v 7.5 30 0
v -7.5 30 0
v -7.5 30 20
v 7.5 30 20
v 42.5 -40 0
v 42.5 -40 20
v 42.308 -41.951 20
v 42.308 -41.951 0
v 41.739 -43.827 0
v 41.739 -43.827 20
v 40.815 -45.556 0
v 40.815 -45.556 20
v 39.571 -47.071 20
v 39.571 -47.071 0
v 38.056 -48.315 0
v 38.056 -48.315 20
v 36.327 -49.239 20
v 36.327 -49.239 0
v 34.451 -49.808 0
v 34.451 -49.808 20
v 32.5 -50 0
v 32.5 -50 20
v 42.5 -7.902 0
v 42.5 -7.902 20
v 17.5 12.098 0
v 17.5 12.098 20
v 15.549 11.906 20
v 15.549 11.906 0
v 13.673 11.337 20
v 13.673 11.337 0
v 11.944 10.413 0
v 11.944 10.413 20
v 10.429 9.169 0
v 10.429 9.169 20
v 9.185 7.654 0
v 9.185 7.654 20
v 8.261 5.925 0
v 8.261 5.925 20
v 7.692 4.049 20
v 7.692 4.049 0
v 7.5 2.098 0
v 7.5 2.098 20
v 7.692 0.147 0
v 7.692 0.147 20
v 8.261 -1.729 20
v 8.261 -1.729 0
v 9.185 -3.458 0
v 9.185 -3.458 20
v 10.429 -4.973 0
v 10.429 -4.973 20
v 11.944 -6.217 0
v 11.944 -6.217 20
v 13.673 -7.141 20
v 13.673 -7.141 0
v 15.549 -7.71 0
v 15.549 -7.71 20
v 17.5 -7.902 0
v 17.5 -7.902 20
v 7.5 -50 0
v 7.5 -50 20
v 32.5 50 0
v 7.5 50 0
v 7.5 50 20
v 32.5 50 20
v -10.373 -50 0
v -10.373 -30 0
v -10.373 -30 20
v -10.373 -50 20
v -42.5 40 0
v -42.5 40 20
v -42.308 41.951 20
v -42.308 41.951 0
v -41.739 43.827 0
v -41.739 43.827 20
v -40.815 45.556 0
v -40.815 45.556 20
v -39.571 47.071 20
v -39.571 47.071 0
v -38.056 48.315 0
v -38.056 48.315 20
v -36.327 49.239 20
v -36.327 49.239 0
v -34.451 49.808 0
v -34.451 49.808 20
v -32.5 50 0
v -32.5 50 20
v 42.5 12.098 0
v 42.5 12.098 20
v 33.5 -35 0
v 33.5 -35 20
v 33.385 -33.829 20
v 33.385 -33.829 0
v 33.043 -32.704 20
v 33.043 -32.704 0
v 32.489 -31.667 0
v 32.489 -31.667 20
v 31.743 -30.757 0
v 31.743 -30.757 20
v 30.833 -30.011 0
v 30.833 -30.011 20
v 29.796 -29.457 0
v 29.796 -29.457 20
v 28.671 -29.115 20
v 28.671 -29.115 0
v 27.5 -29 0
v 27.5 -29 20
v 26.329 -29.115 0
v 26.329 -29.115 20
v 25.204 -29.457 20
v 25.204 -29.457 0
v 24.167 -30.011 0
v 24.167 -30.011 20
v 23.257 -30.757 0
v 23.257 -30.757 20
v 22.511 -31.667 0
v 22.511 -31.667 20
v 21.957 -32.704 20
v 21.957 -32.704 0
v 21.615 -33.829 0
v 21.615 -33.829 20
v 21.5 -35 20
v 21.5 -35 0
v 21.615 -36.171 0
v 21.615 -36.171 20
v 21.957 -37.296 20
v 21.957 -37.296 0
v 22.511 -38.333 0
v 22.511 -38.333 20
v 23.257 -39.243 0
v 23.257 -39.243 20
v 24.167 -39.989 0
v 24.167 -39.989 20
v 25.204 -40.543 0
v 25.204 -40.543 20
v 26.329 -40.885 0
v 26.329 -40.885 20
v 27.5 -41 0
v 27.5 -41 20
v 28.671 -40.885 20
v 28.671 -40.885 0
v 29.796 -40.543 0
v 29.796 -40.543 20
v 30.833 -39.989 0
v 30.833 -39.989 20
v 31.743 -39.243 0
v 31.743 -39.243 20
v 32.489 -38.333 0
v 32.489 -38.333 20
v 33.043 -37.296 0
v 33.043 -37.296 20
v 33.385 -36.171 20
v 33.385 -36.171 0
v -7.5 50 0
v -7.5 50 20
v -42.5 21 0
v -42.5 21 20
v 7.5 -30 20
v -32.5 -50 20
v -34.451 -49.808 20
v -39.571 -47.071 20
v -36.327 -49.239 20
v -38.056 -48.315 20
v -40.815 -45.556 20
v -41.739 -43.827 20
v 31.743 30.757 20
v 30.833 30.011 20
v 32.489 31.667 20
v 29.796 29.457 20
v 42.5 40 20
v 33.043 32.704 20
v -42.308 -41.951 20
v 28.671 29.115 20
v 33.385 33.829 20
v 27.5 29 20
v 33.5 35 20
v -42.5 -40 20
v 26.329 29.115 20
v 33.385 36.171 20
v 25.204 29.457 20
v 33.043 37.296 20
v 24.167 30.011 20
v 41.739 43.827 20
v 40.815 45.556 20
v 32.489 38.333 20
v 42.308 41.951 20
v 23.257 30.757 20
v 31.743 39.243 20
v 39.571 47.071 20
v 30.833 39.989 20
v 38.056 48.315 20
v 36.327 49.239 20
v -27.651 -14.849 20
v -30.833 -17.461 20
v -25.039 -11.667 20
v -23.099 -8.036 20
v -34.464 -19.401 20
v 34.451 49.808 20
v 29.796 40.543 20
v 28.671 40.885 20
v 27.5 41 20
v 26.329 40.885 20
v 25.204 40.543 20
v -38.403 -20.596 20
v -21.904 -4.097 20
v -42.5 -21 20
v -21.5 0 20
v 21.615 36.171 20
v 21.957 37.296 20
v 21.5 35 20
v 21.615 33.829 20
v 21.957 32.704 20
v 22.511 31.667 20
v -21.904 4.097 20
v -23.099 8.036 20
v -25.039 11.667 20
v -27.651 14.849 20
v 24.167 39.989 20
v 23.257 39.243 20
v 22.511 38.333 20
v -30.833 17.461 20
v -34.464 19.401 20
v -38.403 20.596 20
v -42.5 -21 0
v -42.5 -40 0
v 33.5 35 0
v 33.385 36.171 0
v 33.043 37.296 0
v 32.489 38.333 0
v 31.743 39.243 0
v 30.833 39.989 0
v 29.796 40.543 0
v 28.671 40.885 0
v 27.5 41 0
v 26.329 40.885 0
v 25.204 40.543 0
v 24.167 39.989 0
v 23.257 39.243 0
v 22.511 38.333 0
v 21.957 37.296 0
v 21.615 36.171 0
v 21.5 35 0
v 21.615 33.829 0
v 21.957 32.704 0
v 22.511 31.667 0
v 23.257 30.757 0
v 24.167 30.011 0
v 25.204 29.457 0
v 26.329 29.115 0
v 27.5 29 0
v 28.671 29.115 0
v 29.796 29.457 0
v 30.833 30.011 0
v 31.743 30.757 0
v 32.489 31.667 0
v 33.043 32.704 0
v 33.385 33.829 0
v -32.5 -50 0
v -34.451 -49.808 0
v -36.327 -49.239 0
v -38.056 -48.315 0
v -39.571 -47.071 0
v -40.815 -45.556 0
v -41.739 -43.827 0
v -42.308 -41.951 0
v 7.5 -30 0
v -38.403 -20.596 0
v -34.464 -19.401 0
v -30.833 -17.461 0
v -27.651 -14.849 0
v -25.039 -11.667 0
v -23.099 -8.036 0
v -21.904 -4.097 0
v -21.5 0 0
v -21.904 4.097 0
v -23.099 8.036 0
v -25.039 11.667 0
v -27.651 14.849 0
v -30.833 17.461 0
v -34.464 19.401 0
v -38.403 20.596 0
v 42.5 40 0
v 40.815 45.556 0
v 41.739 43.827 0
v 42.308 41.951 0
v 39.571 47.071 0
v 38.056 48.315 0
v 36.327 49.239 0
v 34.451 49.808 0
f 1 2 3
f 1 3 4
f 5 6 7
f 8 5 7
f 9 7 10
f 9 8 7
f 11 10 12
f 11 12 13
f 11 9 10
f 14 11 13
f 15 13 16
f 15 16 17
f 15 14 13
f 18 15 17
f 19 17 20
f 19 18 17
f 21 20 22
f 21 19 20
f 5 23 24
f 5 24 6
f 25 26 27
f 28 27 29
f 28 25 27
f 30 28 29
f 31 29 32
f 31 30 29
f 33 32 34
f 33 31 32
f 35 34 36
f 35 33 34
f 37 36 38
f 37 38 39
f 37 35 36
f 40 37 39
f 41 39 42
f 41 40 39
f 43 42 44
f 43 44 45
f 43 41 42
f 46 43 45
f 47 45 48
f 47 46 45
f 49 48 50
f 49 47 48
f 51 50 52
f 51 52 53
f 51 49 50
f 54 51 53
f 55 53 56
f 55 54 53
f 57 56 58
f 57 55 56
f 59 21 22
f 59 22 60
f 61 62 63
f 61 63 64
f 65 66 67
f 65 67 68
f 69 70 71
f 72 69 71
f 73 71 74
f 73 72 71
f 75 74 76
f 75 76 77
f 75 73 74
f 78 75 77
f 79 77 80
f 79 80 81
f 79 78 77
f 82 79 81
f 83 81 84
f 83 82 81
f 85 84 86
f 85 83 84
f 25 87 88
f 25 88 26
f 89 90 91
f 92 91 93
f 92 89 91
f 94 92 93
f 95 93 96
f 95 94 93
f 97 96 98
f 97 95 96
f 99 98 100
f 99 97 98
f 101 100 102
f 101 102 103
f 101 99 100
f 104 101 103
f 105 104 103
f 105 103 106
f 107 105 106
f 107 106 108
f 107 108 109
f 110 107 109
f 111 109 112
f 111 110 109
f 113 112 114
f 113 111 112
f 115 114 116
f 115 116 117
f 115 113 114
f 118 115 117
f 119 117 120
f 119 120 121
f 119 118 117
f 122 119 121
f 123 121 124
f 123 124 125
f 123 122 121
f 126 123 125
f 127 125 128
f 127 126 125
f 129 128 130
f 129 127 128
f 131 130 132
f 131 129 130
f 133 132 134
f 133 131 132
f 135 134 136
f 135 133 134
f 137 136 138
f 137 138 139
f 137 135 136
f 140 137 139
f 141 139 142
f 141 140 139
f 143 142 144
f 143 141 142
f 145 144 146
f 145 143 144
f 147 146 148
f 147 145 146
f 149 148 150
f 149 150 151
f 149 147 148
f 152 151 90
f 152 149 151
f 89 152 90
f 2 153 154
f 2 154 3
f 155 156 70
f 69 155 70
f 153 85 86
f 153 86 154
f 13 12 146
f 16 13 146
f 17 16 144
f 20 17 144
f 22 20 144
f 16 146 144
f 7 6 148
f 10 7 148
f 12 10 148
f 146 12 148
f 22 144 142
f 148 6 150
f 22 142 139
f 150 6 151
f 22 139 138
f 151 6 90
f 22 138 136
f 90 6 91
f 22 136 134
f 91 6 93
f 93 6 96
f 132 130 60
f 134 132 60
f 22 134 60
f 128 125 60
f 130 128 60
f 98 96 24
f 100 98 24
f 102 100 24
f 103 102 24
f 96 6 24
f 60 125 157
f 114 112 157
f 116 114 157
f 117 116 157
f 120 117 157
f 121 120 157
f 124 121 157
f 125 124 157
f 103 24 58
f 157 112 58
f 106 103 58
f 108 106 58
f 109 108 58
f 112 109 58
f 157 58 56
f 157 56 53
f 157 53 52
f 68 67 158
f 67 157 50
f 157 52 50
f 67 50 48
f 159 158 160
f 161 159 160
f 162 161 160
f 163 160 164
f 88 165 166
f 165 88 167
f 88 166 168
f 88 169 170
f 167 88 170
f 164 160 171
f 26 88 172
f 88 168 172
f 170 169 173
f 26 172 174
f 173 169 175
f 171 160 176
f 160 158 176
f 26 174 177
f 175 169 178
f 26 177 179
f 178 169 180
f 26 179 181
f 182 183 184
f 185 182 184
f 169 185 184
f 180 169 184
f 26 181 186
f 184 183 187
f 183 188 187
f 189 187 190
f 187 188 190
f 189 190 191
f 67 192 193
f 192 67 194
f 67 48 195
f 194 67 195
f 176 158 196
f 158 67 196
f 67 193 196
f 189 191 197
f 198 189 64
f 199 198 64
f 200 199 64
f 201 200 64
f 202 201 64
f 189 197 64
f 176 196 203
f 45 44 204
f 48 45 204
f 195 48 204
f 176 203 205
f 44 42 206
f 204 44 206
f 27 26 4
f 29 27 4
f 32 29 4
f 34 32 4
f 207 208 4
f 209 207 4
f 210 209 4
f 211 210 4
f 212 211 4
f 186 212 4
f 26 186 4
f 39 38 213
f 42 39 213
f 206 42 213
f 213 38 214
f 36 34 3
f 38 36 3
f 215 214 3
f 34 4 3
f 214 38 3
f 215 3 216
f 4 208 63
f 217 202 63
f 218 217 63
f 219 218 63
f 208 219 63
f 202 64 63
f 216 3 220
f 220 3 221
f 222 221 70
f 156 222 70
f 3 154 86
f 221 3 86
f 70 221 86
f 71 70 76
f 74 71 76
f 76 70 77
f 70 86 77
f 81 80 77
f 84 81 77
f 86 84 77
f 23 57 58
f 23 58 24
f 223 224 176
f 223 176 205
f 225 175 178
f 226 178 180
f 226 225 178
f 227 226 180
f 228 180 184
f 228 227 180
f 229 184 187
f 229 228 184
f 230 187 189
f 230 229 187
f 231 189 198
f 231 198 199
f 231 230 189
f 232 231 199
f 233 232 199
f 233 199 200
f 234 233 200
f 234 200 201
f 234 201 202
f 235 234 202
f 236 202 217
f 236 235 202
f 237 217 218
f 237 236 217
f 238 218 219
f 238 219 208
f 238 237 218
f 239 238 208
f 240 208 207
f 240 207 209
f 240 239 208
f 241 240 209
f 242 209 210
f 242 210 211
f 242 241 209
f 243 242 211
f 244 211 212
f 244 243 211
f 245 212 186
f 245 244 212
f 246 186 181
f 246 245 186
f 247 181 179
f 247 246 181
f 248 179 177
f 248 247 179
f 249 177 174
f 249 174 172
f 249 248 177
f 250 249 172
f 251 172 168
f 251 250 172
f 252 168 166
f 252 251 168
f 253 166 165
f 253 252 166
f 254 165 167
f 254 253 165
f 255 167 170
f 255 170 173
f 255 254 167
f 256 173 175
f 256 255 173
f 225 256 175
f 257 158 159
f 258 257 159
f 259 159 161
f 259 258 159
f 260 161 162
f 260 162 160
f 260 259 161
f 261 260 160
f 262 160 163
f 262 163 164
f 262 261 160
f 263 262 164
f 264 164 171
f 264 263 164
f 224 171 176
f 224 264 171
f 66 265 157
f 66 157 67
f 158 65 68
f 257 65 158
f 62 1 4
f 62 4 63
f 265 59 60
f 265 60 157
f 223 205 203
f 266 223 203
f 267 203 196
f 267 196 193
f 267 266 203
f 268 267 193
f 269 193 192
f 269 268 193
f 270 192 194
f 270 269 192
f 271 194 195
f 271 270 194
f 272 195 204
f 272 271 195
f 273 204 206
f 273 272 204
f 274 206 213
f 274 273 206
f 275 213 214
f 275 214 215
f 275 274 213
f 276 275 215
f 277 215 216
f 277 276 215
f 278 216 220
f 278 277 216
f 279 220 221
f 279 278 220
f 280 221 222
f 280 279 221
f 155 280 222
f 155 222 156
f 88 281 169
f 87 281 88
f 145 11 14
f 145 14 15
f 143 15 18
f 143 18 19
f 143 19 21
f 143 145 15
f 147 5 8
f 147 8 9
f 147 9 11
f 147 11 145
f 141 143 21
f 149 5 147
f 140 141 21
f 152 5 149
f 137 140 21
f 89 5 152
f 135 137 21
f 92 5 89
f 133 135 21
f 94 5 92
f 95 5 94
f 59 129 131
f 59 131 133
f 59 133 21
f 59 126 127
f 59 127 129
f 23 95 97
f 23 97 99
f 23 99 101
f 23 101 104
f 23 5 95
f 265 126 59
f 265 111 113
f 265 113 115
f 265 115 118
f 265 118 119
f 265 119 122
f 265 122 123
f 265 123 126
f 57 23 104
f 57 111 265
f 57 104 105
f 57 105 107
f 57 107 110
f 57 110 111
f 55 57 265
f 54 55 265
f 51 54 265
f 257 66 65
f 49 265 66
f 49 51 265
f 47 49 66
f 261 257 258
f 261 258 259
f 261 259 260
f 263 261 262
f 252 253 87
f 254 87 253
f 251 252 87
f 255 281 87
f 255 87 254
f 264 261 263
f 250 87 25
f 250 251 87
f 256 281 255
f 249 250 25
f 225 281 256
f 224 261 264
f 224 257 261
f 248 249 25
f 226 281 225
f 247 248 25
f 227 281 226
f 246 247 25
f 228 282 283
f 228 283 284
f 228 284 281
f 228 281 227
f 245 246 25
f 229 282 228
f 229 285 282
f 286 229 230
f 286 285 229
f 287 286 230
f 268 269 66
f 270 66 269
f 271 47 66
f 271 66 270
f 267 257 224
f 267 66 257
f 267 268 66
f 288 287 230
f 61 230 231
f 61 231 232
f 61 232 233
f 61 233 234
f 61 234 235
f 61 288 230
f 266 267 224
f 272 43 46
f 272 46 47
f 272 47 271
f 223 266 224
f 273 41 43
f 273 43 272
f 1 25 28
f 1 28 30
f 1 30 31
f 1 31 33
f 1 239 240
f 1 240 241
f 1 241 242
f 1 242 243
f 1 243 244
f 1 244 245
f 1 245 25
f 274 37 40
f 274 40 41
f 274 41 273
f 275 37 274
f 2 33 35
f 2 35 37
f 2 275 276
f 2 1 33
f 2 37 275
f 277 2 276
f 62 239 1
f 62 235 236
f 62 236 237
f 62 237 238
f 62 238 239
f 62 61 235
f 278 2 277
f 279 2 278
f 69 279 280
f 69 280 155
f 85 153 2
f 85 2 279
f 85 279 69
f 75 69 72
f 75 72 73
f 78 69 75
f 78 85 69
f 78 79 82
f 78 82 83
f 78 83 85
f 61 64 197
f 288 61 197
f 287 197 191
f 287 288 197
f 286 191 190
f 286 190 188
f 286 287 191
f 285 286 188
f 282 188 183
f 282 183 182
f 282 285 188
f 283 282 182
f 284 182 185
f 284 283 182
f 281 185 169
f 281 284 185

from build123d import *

# Parameters (mm, degrees)
SKETCH1_R           = 6
BOSS_EXTRUDE1_DEPTH = 20


with BuildPart() as part:
    # Sketch1 → Boss-Extrude1 (new body)
    with BuildSketch(Plane.XY):
        with BuildLine():
            Line((-7.5, 50), (-7.5, 30))
            Line((-7.5, 30), (7.5, 30))
            Line((7.5, 30), (7.5, 50))
            Line((7.5, 50), (32.5, 50))
            ThreePointArc((32.5, 50), (39.571067812, 47.071067812), (42.5, 40))
            Line((42.5, 40), (42.5, 12.097843739))
            Line((42.5, 12.097843739), (17.5, 12.097843739))
            ThreePointArc((17.5, 12.097843739), (7.5, 2.097843739), (17.5, -7.902156261))
            Line((17.5, -7.902156261), (42.5, -7.902156261))
            Line((42.5, -7.902156261), (42.5, -40))
            ThreePointArc((42.5, -40), (39.571067812, -47.071067812), (32.5, -50))
            Line((32.5, -50), (7.5, -50))
            Line((7.5, -50), (7.5, -30))
            Line((7.5, -30), (-10.372609166, -30))
            Line((-10.372609166, -30), (-10.372609166, -50))
            Line((-10.372609166, -50), (-32.5, -50))
            ThreePointArc((-32.5, -50), (-39.571067812, -47.071067812), (-42.5, -40))
            Line((-42.5, -40), (-42.5, -21))
            ThreePointArc((-42.5, -21), (-21.5, 0), (-42.5, 21))
            Line((-42.5, 21), (-42.5, 40))
            ThreePointArc((-42.5, 40), (-39.571067812, 47.071067812), (-32.5, 50))
            Line((-32.5, 50), (-7.5, 50))
        make_face()
        with Locations((27.5, 35)):
            Circle(SKETCH1_R, mode=Mode.SUBTRACT)
        with Locations((27.5, -35)):
            Circle(SKETCH1_R, mode=Mode.SUBTRACT)
    extrude(amount=BOSS_EXTRUDE1_DEPTH)


solid = part.part
